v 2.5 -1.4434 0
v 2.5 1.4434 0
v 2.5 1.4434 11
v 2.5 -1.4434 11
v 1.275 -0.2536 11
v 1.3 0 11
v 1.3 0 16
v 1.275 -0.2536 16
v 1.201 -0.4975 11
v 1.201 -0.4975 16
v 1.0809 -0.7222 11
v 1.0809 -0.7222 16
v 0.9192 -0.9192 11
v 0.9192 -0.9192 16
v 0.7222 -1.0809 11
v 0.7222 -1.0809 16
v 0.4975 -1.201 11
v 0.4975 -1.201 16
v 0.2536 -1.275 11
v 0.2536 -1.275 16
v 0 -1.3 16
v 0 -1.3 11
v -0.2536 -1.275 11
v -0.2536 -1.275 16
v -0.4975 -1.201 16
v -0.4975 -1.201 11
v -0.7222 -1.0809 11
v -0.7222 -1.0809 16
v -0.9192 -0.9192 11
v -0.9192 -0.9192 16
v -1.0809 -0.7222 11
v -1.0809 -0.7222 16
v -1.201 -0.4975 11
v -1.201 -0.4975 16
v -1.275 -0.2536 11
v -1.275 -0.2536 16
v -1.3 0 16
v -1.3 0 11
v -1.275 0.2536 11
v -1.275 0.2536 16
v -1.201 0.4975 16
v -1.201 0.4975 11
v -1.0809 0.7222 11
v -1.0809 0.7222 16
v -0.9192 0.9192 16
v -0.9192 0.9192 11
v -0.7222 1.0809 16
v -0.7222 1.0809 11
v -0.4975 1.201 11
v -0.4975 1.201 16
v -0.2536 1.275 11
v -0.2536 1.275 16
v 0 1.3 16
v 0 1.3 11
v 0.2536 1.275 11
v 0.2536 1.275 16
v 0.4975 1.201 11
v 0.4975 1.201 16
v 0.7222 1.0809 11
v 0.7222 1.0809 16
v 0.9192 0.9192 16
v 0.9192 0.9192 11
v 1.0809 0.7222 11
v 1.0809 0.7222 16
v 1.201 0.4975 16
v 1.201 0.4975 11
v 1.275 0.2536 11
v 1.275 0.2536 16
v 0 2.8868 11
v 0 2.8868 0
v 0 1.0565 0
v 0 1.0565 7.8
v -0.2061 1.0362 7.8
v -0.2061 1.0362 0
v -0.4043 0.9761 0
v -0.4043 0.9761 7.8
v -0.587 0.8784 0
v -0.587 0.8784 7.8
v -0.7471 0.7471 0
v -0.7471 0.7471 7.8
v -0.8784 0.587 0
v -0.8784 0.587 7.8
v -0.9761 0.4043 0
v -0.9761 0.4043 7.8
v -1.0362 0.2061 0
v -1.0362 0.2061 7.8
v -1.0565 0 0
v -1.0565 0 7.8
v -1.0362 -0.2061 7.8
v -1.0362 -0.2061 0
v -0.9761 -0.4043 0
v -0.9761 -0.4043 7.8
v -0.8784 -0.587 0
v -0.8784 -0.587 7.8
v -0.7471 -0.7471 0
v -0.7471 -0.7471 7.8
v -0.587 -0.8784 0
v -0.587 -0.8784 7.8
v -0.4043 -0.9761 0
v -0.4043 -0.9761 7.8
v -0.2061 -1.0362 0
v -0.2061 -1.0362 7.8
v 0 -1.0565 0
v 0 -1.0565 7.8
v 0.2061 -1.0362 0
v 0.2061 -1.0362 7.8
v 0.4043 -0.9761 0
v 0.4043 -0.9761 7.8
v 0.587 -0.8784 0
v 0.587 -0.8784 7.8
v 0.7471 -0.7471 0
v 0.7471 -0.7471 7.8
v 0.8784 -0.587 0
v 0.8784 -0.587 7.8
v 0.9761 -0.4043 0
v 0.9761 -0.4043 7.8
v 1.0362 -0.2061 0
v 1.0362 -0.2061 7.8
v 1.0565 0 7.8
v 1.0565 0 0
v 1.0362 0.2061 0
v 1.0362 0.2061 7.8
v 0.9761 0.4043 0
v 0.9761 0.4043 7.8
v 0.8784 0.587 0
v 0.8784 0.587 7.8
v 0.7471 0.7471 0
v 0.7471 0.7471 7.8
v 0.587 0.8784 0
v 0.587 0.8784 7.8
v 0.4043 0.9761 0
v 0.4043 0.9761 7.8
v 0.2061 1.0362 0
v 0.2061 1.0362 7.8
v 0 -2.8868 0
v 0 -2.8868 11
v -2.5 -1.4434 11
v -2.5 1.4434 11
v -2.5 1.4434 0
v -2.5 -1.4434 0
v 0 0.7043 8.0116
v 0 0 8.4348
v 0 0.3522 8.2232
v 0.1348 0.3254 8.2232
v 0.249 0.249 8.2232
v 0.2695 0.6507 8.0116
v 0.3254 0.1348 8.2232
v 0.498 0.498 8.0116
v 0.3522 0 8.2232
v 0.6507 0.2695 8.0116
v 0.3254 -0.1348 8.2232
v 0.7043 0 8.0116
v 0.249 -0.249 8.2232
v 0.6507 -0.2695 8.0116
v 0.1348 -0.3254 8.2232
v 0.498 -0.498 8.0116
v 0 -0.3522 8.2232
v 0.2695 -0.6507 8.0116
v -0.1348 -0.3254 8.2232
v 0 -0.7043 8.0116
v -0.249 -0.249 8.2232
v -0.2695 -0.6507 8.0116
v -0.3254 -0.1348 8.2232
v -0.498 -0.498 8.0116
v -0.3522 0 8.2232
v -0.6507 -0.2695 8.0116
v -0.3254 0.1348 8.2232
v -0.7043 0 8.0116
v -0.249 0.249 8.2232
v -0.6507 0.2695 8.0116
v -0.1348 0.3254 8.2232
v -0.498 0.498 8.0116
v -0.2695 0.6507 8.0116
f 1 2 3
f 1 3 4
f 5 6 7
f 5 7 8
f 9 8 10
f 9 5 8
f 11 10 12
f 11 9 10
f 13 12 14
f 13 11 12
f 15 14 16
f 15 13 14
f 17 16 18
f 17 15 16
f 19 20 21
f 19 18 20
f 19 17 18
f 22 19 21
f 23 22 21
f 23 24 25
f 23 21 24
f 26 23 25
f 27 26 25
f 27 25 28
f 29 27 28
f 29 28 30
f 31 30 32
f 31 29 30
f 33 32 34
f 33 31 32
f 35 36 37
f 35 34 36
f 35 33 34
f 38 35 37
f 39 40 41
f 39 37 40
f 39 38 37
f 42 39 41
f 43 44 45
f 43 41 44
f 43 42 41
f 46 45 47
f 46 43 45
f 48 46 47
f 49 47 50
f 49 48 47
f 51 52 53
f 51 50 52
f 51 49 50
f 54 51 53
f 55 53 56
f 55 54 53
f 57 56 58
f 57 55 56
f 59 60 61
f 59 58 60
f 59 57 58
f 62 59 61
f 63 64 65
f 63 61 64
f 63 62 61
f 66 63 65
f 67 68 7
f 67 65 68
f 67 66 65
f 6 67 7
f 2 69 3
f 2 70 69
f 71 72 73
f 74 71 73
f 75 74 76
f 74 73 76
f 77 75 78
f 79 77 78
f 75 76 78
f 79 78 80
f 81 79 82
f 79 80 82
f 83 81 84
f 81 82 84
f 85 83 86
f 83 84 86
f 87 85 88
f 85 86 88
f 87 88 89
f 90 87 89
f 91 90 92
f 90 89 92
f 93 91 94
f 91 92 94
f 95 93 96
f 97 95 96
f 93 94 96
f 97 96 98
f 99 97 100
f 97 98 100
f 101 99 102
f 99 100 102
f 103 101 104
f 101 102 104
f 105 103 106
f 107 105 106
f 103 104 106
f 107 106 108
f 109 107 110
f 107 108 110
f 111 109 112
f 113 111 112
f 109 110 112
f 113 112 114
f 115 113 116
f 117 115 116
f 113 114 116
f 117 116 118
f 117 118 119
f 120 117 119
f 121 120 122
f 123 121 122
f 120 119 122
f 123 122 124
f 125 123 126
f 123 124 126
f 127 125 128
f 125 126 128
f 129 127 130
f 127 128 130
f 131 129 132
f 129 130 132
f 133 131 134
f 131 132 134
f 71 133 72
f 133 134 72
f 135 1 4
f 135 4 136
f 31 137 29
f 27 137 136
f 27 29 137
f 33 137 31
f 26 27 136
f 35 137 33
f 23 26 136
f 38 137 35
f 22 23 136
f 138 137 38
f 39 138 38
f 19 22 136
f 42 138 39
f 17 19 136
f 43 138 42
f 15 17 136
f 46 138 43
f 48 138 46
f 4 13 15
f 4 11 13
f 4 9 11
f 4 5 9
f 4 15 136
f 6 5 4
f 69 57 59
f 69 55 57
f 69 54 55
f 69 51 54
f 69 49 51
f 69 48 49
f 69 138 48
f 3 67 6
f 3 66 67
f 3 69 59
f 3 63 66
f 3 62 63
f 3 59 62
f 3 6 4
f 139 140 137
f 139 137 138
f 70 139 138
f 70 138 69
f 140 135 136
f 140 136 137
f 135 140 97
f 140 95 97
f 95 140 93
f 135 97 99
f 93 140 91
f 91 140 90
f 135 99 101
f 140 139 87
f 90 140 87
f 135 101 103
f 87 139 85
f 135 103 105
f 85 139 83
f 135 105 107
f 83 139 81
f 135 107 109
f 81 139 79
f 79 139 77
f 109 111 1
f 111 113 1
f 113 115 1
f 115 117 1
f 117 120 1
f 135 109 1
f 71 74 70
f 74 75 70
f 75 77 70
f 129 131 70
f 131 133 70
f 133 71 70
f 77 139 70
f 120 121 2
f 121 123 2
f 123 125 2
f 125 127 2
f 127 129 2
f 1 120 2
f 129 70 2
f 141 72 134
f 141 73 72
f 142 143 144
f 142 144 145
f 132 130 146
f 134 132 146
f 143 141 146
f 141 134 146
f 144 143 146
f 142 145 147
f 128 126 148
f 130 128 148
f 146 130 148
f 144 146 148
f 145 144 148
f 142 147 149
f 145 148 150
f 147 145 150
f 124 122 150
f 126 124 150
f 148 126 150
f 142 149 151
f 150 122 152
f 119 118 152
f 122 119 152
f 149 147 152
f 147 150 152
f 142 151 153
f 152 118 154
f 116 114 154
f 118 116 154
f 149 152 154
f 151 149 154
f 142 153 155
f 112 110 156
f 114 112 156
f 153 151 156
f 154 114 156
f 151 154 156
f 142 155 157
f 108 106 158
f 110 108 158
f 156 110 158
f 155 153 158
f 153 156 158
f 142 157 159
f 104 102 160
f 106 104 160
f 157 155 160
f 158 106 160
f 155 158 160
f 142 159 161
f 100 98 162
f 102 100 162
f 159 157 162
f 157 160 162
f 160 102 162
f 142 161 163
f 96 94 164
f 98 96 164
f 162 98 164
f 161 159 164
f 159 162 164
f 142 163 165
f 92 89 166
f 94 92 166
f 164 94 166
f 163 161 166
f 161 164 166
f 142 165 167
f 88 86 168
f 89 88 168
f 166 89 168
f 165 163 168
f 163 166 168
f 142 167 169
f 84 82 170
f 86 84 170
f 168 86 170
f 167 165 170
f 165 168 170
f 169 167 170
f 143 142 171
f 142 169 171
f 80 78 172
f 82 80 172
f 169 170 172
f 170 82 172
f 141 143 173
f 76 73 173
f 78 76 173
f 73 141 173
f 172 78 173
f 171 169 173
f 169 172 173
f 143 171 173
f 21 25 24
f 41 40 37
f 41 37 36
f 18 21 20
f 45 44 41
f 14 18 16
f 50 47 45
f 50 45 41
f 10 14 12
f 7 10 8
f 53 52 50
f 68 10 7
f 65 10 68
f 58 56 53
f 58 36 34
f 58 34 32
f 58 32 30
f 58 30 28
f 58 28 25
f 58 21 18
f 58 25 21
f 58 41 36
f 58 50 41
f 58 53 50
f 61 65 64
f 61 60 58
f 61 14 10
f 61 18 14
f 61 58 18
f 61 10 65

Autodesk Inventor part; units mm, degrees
ref_plane "YZ Plane" through (0, 0, 0) normal (1, 0, 0) x (0, 1, 0)
ref_plane "XZ Plane" through (0, 0, 0) normal (0, 1, 0) x (-1, 0, 0)
ref_plane "XY Plane" through (0, 0, 0) normal (0, 0, 1) x (1, 0, 0)
sketch "スケッチ1" plane through (0, 0, 0) normal (0, 0, 1) x (1, 0, 0)
  line L0 (0, 2.8868) -> (2.5, 1.4434)
  line L1 (2.5, 1.4434) -> (2.5, -1.4434)
  line L2 (2.5, -1.4434) -> (0, -2.8868)
  line L3 (0, -2.8868) -> (-2.5, -1.4434)
  line L4 (-2.5, -1.4434) -> (-2.5, 1.4434)
  line L5 (-2.5, 1.4434) -> (0, 2.8868)
  point P0 (0, 0)
  point P1 (0, 0)
  dimension "d0" = 5
extrude "押し出し1" add sketch "スケッチ1" along normal blind 11
sketch "スケッチ2" plane through (0, 0, 11) normal (0, 0, 1) x (1, 0, 0)
  circle A0 centre (0, 0) radius 1.3
  dimension "d3" = 2.6
extrude "押し出し2" add sketch "スケッチ2" along normal blind 5
thread "ねじ1" size "M2.6x0.45" class "6g" standard "ANSI Metric M Profile" full length
sketch "スケッチ3" plane through (0, 0, 0) normal (0, 0, -1) x (-1, 0, 0)
  point P0 (0, 0)
hole "穴1" at (0, 0, 0) direction (0, 0, 1) diameter 2.113 depth 7.8 tip angle 118 thread size "M2.6x0.45" class "6H" standard "ISO Metric profile"
properties part number "ジュラコンスペーサー（六角）_BS-2611E" material "アセタール樹脂、白"
